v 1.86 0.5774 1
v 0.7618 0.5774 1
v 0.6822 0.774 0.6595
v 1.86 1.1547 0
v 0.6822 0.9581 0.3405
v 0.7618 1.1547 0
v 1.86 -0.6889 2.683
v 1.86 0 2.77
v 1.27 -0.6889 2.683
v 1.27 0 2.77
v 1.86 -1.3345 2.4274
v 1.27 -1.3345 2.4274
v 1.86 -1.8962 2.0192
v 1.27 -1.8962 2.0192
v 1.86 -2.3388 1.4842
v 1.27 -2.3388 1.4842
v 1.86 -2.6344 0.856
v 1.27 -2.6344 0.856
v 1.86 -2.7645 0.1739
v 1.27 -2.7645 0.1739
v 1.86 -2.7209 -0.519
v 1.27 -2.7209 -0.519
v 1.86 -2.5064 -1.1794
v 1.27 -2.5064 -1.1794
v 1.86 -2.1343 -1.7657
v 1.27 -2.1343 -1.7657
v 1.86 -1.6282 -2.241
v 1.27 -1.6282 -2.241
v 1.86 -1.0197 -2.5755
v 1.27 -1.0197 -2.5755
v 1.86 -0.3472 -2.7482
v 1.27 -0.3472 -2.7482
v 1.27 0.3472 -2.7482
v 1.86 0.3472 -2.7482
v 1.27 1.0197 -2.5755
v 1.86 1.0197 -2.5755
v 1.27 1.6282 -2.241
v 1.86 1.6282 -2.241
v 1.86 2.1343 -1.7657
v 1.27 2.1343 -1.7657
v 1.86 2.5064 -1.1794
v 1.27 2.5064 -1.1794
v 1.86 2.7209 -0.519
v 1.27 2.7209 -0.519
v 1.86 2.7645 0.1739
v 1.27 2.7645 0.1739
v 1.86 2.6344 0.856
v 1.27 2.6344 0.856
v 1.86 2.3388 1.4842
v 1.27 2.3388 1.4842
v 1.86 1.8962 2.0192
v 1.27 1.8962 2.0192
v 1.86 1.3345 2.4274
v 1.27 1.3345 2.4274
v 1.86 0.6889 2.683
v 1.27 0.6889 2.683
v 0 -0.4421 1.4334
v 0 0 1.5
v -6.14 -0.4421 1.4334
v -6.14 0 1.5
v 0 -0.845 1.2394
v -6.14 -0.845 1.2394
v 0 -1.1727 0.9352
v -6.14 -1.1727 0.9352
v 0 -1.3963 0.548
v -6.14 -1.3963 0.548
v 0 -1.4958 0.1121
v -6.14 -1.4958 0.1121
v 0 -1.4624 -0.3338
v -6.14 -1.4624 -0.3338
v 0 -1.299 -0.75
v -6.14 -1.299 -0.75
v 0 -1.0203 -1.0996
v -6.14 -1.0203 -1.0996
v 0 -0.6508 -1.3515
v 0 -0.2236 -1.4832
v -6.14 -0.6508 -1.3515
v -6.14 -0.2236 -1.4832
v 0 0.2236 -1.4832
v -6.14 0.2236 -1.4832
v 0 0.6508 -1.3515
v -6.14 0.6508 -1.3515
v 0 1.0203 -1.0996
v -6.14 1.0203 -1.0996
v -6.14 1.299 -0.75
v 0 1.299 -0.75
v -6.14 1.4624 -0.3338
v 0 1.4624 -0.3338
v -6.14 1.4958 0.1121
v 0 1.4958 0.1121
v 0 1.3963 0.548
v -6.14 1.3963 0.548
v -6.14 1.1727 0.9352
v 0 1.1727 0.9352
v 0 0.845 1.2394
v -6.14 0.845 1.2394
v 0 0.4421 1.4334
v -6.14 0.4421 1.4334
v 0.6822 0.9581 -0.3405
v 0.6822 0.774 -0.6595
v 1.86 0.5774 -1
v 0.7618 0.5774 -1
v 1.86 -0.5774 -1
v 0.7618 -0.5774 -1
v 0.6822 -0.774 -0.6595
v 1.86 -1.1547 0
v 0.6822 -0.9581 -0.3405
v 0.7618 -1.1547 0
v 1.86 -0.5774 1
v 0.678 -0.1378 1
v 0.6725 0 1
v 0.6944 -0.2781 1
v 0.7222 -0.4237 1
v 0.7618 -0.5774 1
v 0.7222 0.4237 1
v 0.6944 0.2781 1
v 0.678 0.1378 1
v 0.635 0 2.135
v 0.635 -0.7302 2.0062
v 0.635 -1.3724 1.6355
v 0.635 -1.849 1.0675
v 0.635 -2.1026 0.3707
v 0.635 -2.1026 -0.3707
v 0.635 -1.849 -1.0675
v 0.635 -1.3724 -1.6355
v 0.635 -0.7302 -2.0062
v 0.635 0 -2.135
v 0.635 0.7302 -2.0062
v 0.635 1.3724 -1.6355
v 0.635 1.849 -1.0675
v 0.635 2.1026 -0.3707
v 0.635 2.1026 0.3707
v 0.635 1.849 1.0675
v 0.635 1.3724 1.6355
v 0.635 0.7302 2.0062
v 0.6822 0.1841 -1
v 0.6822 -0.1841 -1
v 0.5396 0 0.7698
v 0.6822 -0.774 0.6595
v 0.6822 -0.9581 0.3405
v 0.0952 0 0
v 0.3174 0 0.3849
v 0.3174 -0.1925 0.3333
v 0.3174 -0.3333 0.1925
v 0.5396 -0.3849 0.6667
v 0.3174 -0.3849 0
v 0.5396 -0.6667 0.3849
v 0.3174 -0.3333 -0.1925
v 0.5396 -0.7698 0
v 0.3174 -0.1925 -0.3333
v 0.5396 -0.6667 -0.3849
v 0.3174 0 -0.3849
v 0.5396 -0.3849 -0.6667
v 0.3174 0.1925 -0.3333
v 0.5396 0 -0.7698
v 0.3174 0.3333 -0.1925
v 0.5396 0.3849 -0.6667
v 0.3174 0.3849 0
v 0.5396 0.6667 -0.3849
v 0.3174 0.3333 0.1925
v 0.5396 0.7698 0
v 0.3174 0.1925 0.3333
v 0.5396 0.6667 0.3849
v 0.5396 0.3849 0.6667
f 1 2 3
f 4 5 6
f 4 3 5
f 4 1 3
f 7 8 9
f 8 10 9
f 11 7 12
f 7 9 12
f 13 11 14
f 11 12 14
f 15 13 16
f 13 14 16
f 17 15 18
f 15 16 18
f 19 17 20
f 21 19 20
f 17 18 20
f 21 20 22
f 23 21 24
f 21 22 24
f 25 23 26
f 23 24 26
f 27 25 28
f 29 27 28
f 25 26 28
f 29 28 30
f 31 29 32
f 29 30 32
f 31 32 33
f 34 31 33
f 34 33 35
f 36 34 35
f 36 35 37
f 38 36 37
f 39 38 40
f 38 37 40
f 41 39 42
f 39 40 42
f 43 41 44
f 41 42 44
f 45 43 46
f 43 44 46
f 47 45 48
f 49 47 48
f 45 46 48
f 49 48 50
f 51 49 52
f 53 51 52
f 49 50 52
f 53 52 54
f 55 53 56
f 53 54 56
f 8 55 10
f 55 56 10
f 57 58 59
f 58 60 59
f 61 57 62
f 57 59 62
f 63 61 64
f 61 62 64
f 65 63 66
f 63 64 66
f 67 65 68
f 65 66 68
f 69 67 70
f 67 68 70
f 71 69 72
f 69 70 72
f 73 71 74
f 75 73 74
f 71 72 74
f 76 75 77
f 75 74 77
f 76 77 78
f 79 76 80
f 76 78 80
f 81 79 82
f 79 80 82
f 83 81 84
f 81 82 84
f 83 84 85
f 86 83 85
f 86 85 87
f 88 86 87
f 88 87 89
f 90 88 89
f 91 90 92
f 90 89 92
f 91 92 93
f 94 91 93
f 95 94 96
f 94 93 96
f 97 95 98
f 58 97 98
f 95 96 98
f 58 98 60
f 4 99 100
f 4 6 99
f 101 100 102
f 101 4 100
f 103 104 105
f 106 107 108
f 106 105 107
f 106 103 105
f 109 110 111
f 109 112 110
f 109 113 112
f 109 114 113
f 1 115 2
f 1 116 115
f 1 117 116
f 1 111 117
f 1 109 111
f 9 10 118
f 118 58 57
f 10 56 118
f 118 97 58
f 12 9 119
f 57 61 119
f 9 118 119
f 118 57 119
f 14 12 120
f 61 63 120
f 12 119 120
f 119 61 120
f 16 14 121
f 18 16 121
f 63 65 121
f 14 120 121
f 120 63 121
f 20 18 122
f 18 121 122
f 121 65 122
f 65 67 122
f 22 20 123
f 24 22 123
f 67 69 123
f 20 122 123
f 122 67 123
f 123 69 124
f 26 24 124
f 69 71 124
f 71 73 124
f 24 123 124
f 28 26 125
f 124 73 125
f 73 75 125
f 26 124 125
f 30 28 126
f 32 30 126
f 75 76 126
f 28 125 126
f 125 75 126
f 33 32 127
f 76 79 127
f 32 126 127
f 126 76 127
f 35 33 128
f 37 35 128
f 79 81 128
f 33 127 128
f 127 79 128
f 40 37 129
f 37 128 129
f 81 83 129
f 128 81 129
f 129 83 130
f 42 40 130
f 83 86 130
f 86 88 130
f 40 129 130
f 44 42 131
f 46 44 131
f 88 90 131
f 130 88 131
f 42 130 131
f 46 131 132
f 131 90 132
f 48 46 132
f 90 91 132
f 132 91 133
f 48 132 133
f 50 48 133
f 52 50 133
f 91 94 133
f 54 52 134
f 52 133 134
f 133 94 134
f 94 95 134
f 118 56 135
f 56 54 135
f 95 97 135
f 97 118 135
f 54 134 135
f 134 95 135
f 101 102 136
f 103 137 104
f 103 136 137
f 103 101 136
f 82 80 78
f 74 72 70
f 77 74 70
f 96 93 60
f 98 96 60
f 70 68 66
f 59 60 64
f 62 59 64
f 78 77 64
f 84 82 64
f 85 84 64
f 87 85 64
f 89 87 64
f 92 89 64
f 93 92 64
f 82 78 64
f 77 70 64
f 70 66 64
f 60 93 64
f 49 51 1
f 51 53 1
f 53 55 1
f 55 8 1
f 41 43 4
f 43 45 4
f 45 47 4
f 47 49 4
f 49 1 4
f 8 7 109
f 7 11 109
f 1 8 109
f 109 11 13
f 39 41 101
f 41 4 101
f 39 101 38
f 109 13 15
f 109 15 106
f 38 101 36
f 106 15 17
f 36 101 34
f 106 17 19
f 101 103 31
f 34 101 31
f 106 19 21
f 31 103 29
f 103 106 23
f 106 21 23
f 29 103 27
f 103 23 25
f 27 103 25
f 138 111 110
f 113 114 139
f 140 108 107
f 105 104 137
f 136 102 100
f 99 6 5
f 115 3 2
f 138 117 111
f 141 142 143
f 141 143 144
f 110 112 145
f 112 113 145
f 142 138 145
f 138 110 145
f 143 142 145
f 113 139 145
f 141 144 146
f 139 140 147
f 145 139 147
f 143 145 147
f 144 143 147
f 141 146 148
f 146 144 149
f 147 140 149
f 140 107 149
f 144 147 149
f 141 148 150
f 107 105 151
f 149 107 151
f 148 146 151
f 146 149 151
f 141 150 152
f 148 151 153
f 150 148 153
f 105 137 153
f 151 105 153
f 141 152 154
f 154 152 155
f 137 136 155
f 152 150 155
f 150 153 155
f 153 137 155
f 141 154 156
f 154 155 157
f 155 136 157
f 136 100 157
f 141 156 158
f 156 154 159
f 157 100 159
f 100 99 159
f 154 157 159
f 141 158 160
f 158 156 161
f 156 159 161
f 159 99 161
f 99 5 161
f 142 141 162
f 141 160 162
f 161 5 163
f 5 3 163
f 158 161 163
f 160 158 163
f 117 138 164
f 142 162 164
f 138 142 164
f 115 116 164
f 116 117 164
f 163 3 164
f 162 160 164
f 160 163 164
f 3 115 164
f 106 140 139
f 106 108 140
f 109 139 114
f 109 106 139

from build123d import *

# Parameters (mm, degrees)
SLOT_REACH = 11.649


with BuildPart() as part:
    # Sk1 → Body (revolve)
    with BuildSketch(Plane.XY, mode=Mode.PRIVATE) as body_sk:
        Polygon((-6.14, 0), (1.86, 0), (1.86, 2.77), (1.27, 2.77), (0, 1.5), (-6.14, 1.5), align=None)
    revolve(body_sk.sketch.rotate(Axis((0, 0, 0), (1, 0, 0)), 90), axis=Axis((0, 0, 0), (1, 0, 0)))

    # Slot: up to this cone (the profile starts inside it)
    slot_end = Plane(origin=(1.86, 0, 0), z_dir=(1, 0, 0)).offset(-1.764817835) * Cone(1.732e-06, 29.393897654, 16.970573723, align=(Align.CENTER, Align.CENTER, Align.MIN), mode=Mode.PRIVATE)
    # Sk2 → Slot (cut, up to the surface)
    with BuildSketch(Plane(origin=(1.86, 0, -1.86), x_dir=(0, 0, 1), z_dir=(-1, 0, 0)), mode=Mode.PRIVATE) as slot_sk1:
        Polygon((1.86, 1.154700538), (0.86, 0.577350269), (0.86, -0.577350269), (1.86, -1.154700538), (2.86, -0.577350269), (2.86, 0.577350269), align=None)
    slot_tool1 = extrude(slot_sk1.sketch, amount=SLOT_REACH, mode=Mode.PRIVATE) & slot_end
    add(slot_tool1.solids().sort_by_distance((1.86, 0, 0))[0], mode=Mode.SUBTRACT)


solid = part.part
